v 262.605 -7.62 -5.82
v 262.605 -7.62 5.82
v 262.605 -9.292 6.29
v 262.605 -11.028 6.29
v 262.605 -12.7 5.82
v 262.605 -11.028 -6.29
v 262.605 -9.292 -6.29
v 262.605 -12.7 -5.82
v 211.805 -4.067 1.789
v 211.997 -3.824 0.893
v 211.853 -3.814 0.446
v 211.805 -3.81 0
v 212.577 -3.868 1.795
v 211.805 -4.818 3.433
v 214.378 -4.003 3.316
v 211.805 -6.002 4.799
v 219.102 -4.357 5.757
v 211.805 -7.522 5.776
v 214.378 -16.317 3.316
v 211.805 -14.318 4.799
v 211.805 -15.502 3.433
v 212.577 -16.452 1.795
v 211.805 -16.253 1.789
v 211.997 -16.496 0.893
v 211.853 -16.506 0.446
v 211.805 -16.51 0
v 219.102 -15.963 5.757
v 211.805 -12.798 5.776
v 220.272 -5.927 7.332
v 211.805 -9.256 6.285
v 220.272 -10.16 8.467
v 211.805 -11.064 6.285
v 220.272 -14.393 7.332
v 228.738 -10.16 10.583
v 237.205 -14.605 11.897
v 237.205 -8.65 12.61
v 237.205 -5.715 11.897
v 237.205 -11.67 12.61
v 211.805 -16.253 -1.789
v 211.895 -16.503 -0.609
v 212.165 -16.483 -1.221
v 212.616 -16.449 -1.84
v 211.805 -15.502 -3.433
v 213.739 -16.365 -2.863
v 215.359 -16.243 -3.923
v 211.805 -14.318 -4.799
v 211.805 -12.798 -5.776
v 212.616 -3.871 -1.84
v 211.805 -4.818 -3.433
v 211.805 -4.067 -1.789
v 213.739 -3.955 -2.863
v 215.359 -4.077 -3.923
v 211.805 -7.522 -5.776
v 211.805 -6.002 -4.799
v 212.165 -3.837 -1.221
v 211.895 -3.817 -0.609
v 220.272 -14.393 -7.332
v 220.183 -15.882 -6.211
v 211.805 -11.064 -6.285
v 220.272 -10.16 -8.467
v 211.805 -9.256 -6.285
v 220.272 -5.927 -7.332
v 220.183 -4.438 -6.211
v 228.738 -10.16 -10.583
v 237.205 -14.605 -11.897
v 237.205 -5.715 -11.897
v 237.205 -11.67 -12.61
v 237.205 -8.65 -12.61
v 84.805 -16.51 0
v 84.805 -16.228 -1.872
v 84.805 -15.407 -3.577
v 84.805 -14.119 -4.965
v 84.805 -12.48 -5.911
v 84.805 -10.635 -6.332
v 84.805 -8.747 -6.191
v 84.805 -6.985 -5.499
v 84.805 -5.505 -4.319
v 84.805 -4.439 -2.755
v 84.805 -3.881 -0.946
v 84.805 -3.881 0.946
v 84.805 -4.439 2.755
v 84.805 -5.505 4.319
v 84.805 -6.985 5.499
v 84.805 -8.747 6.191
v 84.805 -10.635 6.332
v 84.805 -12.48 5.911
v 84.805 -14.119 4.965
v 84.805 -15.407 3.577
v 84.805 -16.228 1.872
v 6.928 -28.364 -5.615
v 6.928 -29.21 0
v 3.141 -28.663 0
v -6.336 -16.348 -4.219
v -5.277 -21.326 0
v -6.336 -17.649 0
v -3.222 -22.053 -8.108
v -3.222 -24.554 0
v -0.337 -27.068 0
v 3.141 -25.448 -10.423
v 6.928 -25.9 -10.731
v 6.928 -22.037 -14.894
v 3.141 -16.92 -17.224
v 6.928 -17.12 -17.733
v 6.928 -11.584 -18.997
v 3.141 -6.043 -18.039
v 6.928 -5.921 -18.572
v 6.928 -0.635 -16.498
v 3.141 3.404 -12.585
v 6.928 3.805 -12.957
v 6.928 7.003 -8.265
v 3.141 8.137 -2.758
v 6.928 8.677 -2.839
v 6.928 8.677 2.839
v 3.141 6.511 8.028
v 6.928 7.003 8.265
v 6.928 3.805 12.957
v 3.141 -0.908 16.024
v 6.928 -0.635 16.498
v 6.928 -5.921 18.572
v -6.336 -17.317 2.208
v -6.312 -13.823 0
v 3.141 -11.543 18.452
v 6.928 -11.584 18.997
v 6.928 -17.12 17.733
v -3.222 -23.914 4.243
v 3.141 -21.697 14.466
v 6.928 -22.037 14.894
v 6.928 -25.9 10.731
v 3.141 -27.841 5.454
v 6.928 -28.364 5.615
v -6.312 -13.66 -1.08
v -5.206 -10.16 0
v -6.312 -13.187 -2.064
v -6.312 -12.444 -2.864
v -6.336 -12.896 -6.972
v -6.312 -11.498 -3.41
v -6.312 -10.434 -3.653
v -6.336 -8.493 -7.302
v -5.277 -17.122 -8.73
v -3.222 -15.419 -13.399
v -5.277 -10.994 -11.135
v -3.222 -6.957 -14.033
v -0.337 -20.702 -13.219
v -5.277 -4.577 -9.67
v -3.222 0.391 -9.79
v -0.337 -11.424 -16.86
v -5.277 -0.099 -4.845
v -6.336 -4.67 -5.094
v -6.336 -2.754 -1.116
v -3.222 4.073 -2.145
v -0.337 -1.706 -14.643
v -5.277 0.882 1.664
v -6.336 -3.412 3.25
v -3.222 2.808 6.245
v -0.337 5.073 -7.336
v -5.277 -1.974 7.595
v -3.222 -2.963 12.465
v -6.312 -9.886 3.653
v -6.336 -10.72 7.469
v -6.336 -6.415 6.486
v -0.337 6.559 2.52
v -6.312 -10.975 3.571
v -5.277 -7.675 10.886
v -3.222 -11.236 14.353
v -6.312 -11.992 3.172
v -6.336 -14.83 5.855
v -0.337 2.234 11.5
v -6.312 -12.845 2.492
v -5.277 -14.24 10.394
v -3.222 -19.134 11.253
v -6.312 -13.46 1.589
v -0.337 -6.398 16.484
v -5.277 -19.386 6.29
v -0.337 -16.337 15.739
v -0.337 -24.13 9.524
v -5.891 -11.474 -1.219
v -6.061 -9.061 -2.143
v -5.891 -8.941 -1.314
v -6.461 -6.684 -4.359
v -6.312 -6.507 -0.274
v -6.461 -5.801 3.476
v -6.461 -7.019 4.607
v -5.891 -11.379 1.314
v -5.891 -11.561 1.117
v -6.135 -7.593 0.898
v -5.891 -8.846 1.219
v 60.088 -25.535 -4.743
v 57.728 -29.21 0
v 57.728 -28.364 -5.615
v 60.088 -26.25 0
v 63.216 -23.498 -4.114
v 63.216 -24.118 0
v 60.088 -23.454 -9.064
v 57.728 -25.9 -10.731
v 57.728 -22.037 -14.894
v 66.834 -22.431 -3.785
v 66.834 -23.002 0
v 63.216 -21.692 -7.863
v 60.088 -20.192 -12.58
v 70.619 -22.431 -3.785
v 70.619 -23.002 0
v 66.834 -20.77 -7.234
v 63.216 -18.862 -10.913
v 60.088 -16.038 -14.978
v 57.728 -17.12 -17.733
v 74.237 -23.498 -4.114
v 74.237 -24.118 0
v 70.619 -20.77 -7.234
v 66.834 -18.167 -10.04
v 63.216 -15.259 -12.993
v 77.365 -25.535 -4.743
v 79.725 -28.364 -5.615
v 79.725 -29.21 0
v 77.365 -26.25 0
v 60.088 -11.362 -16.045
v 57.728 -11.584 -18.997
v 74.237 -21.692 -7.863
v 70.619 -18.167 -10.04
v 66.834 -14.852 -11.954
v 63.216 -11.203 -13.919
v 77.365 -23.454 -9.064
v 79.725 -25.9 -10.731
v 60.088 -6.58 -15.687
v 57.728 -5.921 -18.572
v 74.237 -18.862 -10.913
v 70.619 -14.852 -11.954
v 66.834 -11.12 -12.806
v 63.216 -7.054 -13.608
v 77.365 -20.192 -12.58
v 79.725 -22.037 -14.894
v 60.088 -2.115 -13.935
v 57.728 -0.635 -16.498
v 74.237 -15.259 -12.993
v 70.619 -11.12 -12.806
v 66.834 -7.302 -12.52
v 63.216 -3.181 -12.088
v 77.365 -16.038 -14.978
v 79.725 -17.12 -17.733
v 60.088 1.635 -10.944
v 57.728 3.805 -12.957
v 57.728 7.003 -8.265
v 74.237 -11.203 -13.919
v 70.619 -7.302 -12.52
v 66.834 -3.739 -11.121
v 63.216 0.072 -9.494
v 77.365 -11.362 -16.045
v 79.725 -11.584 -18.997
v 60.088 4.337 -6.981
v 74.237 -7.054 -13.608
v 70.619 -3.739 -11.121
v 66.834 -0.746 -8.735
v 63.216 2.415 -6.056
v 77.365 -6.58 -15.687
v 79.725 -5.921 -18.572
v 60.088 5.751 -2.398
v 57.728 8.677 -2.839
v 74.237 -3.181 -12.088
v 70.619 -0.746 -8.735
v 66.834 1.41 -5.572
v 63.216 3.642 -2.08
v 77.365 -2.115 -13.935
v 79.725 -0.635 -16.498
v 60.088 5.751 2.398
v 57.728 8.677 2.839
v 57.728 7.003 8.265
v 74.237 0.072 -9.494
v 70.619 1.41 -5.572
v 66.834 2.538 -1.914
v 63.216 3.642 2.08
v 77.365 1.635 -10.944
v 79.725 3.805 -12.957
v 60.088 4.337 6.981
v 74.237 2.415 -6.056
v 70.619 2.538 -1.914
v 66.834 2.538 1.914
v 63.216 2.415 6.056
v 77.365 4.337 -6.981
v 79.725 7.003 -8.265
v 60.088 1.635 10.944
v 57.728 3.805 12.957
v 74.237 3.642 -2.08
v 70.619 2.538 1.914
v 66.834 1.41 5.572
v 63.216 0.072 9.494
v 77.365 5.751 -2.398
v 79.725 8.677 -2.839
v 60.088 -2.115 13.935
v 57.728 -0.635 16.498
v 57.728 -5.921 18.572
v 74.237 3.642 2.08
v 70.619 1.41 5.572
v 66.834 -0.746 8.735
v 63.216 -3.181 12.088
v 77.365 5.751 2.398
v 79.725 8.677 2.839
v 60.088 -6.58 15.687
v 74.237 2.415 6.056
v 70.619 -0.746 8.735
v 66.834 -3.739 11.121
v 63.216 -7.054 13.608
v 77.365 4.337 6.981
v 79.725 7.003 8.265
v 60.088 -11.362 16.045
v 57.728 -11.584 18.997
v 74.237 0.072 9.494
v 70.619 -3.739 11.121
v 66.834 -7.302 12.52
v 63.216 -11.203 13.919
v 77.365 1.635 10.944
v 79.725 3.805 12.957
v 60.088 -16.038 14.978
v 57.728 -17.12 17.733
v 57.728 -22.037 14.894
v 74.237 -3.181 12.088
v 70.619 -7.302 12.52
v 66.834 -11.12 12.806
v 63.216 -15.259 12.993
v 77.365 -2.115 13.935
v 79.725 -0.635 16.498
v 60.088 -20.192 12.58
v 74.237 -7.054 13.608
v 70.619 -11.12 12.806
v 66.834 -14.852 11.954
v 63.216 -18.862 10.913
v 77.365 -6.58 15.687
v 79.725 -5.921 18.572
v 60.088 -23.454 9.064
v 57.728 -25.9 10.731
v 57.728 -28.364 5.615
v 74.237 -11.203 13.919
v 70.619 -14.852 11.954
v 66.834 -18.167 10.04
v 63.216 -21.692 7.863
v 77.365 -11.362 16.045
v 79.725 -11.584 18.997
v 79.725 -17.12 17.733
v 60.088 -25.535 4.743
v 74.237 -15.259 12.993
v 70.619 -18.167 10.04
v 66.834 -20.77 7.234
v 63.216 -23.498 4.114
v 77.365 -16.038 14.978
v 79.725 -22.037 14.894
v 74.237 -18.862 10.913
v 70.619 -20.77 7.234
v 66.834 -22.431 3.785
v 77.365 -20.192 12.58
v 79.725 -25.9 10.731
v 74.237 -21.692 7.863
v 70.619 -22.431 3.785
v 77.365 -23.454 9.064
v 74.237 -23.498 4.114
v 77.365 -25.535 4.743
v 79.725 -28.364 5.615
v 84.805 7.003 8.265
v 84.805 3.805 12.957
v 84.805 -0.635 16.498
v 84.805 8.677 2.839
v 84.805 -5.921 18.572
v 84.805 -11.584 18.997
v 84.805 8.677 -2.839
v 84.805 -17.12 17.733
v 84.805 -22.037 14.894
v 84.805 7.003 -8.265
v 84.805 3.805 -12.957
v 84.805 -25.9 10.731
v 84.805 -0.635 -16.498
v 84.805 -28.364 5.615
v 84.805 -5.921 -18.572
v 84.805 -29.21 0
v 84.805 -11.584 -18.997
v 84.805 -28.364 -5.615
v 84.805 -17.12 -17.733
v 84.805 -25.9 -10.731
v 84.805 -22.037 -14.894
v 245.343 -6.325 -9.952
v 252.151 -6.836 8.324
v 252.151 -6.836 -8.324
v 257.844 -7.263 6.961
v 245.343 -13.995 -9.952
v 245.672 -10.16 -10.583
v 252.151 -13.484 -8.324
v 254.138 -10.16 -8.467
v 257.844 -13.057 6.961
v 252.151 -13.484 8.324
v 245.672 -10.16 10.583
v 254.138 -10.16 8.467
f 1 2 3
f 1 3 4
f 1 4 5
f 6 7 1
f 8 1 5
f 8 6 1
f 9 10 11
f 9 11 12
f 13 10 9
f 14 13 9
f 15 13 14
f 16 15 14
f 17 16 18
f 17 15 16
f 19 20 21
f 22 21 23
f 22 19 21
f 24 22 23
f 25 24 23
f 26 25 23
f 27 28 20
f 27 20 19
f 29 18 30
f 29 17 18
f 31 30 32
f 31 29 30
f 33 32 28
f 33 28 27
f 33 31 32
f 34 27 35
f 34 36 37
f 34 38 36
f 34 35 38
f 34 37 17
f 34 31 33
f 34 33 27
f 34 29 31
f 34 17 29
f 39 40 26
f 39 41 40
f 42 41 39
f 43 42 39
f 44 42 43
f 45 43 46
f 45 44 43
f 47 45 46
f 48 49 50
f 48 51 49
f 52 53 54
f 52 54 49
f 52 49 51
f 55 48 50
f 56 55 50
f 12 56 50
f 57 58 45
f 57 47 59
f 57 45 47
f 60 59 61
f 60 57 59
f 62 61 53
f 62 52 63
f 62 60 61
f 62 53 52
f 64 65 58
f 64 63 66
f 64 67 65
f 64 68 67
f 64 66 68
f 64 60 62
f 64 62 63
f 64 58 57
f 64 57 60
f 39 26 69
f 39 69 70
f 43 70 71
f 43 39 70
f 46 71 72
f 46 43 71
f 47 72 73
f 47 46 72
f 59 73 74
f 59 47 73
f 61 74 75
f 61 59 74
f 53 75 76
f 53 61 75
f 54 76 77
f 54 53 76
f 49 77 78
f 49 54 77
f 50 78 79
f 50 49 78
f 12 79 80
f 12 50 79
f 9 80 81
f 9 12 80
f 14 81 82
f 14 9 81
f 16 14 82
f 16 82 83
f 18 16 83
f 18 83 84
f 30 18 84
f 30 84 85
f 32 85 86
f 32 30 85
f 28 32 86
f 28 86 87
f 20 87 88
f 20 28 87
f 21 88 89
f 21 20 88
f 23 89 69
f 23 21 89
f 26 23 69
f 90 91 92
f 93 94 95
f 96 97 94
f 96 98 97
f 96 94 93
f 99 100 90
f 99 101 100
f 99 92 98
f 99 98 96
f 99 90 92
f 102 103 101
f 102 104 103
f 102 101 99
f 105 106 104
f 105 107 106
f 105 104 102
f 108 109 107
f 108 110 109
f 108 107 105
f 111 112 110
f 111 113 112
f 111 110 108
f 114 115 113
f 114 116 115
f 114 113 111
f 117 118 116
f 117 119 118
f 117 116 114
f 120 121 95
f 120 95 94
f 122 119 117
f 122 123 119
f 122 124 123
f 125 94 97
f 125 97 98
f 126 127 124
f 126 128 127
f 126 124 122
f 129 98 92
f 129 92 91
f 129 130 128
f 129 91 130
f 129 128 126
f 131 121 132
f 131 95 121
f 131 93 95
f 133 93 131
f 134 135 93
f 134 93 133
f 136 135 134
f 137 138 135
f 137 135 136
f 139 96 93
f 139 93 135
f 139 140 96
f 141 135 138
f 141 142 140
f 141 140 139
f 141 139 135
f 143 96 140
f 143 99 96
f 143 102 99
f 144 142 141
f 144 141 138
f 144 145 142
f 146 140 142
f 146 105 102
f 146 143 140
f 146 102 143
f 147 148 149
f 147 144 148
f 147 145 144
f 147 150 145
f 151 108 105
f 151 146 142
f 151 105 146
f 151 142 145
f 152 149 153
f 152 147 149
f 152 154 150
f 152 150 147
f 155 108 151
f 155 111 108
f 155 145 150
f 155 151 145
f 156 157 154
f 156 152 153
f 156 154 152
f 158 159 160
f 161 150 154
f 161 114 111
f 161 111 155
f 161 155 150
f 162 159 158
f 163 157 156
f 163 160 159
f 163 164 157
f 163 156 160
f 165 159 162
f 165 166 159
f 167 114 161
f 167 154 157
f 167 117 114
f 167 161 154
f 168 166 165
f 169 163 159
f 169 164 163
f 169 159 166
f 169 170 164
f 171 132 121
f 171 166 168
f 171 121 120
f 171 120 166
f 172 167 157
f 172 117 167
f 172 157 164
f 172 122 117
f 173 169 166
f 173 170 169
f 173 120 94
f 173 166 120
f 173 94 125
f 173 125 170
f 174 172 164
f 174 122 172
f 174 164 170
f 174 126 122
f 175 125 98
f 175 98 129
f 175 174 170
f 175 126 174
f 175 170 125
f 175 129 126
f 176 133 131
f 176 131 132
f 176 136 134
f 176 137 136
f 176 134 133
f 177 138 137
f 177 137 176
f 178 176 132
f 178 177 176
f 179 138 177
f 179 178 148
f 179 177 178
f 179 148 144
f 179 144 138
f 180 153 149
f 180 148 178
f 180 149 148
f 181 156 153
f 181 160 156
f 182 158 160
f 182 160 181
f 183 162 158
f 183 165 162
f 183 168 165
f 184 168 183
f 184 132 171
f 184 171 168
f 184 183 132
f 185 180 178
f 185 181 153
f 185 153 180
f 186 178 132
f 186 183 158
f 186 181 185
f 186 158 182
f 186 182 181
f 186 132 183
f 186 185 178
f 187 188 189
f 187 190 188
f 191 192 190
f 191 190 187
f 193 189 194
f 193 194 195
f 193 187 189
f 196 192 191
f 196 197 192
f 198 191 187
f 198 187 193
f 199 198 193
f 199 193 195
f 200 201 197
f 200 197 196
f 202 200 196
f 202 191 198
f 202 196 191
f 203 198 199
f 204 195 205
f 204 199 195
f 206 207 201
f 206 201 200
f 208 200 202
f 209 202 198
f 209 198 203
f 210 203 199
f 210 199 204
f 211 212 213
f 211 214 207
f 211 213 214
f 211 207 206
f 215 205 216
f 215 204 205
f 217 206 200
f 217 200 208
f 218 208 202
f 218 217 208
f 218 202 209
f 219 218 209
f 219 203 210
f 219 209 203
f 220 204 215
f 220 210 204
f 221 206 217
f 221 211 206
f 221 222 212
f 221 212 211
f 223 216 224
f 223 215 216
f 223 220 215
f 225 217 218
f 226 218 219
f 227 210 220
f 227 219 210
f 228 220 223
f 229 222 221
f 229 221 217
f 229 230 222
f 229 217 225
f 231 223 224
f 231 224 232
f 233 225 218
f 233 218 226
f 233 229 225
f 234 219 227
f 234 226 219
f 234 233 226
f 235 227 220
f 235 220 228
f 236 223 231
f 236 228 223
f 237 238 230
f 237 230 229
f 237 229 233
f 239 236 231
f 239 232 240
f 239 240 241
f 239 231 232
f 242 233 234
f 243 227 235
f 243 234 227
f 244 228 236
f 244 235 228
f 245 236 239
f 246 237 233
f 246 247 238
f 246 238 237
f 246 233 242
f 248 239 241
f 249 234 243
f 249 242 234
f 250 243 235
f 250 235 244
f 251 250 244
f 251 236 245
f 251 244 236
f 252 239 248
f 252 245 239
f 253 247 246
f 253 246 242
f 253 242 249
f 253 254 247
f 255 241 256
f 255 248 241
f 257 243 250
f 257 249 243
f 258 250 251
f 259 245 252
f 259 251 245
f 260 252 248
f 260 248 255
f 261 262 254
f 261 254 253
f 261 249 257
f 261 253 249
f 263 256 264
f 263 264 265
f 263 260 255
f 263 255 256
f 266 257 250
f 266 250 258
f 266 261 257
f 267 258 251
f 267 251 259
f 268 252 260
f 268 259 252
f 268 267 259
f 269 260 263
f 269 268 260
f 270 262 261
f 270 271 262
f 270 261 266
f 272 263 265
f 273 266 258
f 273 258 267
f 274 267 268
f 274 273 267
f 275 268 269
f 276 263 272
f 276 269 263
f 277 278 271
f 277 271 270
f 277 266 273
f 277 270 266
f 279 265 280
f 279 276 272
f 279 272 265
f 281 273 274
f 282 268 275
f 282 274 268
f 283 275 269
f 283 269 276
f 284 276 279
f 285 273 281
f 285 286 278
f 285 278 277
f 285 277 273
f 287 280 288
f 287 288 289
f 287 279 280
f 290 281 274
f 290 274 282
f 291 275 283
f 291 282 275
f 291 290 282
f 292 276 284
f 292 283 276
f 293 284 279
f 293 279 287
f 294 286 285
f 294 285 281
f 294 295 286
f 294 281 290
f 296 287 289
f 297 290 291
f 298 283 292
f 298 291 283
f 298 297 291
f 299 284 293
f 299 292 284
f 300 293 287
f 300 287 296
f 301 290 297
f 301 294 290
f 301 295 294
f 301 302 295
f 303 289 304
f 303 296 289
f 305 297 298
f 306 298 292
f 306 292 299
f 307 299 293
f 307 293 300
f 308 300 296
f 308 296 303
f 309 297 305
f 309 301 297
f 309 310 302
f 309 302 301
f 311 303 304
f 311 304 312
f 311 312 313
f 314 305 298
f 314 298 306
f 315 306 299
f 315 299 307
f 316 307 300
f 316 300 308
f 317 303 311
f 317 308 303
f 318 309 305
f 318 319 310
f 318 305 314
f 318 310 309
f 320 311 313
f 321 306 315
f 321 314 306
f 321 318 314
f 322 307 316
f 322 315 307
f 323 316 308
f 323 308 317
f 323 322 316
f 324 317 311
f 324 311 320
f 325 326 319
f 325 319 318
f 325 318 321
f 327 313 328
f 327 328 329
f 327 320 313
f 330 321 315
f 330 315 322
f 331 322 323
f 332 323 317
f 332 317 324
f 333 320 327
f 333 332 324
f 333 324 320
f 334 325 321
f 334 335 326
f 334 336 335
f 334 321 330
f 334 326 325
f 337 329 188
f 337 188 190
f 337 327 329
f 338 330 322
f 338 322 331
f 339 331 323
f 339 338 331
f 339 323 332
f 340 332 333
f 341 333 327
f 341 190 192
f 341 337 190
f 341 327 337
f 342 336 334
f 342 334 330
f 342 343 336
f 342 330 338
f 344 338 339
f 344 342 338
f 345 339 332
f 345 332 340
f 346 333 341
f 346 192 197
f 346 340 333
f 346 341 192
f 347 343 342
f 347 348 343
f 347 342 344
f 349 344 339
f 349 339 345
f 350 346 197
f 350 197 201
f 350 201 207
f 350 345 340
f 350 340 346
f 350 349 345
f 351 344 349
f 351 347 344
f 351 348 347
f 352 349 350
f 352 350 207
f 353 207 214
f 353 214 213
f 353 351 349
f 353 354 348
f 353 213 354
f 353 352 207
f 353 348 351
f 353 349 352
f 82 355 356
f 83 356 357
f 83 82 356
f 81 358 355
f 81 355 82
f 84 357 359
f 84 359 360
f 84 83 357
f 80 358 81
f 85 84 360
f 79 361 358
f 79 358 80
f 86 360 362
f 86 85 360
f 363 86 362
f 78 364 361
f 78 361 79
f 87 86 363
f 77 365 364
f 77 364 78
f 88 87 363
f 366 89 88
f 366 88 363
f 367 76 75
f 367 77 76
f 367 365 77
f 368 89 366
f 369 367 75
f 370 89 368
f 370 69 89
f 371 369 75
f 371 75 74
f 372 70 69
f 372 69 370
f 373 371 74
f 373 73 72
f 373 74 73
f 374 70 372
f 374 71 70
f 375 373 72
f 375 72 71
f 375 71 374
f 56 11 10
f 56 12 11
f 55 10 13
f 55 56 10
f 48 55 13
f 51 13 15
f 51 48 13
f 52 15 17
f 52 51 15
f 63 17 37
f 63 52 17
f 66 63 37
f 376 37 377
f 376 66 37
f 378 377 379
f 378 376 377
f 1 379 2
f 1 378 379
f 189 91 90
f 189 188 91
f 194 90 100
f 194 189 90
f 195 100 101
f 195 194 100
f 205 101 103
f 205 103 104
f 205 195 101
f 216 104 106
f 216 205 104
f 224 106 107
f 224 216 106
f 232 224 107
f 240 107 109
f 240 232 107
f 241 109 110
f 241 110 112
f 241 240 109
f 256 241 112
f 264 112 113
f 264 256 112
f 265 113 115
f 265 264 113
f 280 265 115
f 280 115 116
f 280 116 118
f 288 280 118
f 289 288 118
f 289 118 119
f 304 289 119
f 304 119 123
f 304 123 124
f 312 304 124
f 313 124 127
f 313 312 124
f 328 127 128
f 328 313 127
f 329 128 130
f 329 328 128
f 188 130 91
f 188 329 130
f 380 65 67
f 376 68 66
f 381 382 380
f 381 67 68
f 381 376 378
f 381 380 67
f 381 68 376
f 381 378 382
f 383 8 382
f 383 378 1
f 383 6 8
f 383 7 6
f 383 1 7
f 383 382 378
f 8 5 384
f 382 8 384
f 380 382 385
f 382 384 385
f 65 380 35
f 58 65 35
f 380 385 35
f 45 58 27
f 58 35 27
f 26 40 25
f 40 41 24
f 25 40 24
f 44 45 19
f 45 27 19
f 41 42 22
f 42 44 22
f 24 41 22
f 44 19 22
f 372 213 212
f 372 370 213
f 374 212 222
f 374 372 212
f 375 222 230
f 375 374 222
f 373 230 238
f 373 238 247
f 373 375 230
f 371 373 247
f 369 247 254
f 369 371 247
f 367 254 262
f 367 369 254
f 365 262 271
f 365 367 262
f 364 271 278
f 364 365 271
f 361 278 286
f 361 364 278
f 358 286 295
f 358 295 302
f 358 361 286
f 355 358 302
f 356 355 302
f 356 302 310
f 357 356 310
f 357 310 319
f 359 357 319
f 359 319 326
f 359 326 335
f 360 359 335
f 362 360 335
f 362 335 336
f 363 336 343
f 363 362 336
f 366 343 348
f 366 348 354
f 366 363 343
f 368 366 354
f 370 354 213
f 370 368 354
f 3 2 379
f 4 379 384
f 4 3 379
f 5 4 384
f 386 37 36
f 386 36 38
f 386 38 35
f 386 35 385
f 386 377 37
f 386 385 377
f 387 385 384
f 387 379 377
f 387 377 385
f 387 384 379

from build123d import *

# Parameters (mm, degrees)
CUT_EXTRUDE2_DEPTH = 25.4


with BuildPart() as part:
    # Sketch1 → Revolve6 (revolve)
    with BuildSketch(Plane.XY, mode=Mode.PRIVATE) as revolve6_sk:
        with BuildLine():
            Line((6.927857085, 8.89), (57.727857085, 8.89))
            ThreePointArc((57.727857085, 8.89), (68.726379713, 2.54), (79.724902341, 8.89))
            Line((79.724902341, 8.89), (84.804902341, 8.89))
            Line((84.804902341, 8.89), (84.804902341, -3.81))
            Line((84.804902341, -3.81), (211.804902341, -3.81))
            Line((211.804902341, -3.81), (237.204902341, 2.54))
            Line((237.204902341, 2.54), (262.604902341, -3.81))
            Line((262.604902341, -3.81), (262.604902341, -10.16))
            Line((262.604902341, -10.16), (-5.206352051, -10.16))
            ThreePointArc((-5.206352051, -10.16), (-4.365299375, 2.693819245), (6.927857085, 8.89))
        make_face()
    revolve(revolve6_sk.sketch.rotate(Axis((-5.206352051, -10.16, 0), (1, 0, 0)), 180), axis=Axis((-5.206352051, -10.16, 0), (1, 0, 0)))

    # Sketch3 → Cut-Extrude2 (cut, symmetric)
    with BuildSketch(Plane.XY):
        Polygon((211.804902341, -3.81), (262.604902341, -7.62), (262.604902341, 19.982961782), (211.804902341, 19.982961782), align=None)
        Polygon((262.604902341, -40.302961782), (262.604902341, -12.7), (211.804902341, -16.51), (211.804902341, -40.302961782), align=None)
    extrude(amount=CUT_EXTRUDE2_DEPTH, both=True, mode=Mode.SUBTRACT)


solid = part.part
